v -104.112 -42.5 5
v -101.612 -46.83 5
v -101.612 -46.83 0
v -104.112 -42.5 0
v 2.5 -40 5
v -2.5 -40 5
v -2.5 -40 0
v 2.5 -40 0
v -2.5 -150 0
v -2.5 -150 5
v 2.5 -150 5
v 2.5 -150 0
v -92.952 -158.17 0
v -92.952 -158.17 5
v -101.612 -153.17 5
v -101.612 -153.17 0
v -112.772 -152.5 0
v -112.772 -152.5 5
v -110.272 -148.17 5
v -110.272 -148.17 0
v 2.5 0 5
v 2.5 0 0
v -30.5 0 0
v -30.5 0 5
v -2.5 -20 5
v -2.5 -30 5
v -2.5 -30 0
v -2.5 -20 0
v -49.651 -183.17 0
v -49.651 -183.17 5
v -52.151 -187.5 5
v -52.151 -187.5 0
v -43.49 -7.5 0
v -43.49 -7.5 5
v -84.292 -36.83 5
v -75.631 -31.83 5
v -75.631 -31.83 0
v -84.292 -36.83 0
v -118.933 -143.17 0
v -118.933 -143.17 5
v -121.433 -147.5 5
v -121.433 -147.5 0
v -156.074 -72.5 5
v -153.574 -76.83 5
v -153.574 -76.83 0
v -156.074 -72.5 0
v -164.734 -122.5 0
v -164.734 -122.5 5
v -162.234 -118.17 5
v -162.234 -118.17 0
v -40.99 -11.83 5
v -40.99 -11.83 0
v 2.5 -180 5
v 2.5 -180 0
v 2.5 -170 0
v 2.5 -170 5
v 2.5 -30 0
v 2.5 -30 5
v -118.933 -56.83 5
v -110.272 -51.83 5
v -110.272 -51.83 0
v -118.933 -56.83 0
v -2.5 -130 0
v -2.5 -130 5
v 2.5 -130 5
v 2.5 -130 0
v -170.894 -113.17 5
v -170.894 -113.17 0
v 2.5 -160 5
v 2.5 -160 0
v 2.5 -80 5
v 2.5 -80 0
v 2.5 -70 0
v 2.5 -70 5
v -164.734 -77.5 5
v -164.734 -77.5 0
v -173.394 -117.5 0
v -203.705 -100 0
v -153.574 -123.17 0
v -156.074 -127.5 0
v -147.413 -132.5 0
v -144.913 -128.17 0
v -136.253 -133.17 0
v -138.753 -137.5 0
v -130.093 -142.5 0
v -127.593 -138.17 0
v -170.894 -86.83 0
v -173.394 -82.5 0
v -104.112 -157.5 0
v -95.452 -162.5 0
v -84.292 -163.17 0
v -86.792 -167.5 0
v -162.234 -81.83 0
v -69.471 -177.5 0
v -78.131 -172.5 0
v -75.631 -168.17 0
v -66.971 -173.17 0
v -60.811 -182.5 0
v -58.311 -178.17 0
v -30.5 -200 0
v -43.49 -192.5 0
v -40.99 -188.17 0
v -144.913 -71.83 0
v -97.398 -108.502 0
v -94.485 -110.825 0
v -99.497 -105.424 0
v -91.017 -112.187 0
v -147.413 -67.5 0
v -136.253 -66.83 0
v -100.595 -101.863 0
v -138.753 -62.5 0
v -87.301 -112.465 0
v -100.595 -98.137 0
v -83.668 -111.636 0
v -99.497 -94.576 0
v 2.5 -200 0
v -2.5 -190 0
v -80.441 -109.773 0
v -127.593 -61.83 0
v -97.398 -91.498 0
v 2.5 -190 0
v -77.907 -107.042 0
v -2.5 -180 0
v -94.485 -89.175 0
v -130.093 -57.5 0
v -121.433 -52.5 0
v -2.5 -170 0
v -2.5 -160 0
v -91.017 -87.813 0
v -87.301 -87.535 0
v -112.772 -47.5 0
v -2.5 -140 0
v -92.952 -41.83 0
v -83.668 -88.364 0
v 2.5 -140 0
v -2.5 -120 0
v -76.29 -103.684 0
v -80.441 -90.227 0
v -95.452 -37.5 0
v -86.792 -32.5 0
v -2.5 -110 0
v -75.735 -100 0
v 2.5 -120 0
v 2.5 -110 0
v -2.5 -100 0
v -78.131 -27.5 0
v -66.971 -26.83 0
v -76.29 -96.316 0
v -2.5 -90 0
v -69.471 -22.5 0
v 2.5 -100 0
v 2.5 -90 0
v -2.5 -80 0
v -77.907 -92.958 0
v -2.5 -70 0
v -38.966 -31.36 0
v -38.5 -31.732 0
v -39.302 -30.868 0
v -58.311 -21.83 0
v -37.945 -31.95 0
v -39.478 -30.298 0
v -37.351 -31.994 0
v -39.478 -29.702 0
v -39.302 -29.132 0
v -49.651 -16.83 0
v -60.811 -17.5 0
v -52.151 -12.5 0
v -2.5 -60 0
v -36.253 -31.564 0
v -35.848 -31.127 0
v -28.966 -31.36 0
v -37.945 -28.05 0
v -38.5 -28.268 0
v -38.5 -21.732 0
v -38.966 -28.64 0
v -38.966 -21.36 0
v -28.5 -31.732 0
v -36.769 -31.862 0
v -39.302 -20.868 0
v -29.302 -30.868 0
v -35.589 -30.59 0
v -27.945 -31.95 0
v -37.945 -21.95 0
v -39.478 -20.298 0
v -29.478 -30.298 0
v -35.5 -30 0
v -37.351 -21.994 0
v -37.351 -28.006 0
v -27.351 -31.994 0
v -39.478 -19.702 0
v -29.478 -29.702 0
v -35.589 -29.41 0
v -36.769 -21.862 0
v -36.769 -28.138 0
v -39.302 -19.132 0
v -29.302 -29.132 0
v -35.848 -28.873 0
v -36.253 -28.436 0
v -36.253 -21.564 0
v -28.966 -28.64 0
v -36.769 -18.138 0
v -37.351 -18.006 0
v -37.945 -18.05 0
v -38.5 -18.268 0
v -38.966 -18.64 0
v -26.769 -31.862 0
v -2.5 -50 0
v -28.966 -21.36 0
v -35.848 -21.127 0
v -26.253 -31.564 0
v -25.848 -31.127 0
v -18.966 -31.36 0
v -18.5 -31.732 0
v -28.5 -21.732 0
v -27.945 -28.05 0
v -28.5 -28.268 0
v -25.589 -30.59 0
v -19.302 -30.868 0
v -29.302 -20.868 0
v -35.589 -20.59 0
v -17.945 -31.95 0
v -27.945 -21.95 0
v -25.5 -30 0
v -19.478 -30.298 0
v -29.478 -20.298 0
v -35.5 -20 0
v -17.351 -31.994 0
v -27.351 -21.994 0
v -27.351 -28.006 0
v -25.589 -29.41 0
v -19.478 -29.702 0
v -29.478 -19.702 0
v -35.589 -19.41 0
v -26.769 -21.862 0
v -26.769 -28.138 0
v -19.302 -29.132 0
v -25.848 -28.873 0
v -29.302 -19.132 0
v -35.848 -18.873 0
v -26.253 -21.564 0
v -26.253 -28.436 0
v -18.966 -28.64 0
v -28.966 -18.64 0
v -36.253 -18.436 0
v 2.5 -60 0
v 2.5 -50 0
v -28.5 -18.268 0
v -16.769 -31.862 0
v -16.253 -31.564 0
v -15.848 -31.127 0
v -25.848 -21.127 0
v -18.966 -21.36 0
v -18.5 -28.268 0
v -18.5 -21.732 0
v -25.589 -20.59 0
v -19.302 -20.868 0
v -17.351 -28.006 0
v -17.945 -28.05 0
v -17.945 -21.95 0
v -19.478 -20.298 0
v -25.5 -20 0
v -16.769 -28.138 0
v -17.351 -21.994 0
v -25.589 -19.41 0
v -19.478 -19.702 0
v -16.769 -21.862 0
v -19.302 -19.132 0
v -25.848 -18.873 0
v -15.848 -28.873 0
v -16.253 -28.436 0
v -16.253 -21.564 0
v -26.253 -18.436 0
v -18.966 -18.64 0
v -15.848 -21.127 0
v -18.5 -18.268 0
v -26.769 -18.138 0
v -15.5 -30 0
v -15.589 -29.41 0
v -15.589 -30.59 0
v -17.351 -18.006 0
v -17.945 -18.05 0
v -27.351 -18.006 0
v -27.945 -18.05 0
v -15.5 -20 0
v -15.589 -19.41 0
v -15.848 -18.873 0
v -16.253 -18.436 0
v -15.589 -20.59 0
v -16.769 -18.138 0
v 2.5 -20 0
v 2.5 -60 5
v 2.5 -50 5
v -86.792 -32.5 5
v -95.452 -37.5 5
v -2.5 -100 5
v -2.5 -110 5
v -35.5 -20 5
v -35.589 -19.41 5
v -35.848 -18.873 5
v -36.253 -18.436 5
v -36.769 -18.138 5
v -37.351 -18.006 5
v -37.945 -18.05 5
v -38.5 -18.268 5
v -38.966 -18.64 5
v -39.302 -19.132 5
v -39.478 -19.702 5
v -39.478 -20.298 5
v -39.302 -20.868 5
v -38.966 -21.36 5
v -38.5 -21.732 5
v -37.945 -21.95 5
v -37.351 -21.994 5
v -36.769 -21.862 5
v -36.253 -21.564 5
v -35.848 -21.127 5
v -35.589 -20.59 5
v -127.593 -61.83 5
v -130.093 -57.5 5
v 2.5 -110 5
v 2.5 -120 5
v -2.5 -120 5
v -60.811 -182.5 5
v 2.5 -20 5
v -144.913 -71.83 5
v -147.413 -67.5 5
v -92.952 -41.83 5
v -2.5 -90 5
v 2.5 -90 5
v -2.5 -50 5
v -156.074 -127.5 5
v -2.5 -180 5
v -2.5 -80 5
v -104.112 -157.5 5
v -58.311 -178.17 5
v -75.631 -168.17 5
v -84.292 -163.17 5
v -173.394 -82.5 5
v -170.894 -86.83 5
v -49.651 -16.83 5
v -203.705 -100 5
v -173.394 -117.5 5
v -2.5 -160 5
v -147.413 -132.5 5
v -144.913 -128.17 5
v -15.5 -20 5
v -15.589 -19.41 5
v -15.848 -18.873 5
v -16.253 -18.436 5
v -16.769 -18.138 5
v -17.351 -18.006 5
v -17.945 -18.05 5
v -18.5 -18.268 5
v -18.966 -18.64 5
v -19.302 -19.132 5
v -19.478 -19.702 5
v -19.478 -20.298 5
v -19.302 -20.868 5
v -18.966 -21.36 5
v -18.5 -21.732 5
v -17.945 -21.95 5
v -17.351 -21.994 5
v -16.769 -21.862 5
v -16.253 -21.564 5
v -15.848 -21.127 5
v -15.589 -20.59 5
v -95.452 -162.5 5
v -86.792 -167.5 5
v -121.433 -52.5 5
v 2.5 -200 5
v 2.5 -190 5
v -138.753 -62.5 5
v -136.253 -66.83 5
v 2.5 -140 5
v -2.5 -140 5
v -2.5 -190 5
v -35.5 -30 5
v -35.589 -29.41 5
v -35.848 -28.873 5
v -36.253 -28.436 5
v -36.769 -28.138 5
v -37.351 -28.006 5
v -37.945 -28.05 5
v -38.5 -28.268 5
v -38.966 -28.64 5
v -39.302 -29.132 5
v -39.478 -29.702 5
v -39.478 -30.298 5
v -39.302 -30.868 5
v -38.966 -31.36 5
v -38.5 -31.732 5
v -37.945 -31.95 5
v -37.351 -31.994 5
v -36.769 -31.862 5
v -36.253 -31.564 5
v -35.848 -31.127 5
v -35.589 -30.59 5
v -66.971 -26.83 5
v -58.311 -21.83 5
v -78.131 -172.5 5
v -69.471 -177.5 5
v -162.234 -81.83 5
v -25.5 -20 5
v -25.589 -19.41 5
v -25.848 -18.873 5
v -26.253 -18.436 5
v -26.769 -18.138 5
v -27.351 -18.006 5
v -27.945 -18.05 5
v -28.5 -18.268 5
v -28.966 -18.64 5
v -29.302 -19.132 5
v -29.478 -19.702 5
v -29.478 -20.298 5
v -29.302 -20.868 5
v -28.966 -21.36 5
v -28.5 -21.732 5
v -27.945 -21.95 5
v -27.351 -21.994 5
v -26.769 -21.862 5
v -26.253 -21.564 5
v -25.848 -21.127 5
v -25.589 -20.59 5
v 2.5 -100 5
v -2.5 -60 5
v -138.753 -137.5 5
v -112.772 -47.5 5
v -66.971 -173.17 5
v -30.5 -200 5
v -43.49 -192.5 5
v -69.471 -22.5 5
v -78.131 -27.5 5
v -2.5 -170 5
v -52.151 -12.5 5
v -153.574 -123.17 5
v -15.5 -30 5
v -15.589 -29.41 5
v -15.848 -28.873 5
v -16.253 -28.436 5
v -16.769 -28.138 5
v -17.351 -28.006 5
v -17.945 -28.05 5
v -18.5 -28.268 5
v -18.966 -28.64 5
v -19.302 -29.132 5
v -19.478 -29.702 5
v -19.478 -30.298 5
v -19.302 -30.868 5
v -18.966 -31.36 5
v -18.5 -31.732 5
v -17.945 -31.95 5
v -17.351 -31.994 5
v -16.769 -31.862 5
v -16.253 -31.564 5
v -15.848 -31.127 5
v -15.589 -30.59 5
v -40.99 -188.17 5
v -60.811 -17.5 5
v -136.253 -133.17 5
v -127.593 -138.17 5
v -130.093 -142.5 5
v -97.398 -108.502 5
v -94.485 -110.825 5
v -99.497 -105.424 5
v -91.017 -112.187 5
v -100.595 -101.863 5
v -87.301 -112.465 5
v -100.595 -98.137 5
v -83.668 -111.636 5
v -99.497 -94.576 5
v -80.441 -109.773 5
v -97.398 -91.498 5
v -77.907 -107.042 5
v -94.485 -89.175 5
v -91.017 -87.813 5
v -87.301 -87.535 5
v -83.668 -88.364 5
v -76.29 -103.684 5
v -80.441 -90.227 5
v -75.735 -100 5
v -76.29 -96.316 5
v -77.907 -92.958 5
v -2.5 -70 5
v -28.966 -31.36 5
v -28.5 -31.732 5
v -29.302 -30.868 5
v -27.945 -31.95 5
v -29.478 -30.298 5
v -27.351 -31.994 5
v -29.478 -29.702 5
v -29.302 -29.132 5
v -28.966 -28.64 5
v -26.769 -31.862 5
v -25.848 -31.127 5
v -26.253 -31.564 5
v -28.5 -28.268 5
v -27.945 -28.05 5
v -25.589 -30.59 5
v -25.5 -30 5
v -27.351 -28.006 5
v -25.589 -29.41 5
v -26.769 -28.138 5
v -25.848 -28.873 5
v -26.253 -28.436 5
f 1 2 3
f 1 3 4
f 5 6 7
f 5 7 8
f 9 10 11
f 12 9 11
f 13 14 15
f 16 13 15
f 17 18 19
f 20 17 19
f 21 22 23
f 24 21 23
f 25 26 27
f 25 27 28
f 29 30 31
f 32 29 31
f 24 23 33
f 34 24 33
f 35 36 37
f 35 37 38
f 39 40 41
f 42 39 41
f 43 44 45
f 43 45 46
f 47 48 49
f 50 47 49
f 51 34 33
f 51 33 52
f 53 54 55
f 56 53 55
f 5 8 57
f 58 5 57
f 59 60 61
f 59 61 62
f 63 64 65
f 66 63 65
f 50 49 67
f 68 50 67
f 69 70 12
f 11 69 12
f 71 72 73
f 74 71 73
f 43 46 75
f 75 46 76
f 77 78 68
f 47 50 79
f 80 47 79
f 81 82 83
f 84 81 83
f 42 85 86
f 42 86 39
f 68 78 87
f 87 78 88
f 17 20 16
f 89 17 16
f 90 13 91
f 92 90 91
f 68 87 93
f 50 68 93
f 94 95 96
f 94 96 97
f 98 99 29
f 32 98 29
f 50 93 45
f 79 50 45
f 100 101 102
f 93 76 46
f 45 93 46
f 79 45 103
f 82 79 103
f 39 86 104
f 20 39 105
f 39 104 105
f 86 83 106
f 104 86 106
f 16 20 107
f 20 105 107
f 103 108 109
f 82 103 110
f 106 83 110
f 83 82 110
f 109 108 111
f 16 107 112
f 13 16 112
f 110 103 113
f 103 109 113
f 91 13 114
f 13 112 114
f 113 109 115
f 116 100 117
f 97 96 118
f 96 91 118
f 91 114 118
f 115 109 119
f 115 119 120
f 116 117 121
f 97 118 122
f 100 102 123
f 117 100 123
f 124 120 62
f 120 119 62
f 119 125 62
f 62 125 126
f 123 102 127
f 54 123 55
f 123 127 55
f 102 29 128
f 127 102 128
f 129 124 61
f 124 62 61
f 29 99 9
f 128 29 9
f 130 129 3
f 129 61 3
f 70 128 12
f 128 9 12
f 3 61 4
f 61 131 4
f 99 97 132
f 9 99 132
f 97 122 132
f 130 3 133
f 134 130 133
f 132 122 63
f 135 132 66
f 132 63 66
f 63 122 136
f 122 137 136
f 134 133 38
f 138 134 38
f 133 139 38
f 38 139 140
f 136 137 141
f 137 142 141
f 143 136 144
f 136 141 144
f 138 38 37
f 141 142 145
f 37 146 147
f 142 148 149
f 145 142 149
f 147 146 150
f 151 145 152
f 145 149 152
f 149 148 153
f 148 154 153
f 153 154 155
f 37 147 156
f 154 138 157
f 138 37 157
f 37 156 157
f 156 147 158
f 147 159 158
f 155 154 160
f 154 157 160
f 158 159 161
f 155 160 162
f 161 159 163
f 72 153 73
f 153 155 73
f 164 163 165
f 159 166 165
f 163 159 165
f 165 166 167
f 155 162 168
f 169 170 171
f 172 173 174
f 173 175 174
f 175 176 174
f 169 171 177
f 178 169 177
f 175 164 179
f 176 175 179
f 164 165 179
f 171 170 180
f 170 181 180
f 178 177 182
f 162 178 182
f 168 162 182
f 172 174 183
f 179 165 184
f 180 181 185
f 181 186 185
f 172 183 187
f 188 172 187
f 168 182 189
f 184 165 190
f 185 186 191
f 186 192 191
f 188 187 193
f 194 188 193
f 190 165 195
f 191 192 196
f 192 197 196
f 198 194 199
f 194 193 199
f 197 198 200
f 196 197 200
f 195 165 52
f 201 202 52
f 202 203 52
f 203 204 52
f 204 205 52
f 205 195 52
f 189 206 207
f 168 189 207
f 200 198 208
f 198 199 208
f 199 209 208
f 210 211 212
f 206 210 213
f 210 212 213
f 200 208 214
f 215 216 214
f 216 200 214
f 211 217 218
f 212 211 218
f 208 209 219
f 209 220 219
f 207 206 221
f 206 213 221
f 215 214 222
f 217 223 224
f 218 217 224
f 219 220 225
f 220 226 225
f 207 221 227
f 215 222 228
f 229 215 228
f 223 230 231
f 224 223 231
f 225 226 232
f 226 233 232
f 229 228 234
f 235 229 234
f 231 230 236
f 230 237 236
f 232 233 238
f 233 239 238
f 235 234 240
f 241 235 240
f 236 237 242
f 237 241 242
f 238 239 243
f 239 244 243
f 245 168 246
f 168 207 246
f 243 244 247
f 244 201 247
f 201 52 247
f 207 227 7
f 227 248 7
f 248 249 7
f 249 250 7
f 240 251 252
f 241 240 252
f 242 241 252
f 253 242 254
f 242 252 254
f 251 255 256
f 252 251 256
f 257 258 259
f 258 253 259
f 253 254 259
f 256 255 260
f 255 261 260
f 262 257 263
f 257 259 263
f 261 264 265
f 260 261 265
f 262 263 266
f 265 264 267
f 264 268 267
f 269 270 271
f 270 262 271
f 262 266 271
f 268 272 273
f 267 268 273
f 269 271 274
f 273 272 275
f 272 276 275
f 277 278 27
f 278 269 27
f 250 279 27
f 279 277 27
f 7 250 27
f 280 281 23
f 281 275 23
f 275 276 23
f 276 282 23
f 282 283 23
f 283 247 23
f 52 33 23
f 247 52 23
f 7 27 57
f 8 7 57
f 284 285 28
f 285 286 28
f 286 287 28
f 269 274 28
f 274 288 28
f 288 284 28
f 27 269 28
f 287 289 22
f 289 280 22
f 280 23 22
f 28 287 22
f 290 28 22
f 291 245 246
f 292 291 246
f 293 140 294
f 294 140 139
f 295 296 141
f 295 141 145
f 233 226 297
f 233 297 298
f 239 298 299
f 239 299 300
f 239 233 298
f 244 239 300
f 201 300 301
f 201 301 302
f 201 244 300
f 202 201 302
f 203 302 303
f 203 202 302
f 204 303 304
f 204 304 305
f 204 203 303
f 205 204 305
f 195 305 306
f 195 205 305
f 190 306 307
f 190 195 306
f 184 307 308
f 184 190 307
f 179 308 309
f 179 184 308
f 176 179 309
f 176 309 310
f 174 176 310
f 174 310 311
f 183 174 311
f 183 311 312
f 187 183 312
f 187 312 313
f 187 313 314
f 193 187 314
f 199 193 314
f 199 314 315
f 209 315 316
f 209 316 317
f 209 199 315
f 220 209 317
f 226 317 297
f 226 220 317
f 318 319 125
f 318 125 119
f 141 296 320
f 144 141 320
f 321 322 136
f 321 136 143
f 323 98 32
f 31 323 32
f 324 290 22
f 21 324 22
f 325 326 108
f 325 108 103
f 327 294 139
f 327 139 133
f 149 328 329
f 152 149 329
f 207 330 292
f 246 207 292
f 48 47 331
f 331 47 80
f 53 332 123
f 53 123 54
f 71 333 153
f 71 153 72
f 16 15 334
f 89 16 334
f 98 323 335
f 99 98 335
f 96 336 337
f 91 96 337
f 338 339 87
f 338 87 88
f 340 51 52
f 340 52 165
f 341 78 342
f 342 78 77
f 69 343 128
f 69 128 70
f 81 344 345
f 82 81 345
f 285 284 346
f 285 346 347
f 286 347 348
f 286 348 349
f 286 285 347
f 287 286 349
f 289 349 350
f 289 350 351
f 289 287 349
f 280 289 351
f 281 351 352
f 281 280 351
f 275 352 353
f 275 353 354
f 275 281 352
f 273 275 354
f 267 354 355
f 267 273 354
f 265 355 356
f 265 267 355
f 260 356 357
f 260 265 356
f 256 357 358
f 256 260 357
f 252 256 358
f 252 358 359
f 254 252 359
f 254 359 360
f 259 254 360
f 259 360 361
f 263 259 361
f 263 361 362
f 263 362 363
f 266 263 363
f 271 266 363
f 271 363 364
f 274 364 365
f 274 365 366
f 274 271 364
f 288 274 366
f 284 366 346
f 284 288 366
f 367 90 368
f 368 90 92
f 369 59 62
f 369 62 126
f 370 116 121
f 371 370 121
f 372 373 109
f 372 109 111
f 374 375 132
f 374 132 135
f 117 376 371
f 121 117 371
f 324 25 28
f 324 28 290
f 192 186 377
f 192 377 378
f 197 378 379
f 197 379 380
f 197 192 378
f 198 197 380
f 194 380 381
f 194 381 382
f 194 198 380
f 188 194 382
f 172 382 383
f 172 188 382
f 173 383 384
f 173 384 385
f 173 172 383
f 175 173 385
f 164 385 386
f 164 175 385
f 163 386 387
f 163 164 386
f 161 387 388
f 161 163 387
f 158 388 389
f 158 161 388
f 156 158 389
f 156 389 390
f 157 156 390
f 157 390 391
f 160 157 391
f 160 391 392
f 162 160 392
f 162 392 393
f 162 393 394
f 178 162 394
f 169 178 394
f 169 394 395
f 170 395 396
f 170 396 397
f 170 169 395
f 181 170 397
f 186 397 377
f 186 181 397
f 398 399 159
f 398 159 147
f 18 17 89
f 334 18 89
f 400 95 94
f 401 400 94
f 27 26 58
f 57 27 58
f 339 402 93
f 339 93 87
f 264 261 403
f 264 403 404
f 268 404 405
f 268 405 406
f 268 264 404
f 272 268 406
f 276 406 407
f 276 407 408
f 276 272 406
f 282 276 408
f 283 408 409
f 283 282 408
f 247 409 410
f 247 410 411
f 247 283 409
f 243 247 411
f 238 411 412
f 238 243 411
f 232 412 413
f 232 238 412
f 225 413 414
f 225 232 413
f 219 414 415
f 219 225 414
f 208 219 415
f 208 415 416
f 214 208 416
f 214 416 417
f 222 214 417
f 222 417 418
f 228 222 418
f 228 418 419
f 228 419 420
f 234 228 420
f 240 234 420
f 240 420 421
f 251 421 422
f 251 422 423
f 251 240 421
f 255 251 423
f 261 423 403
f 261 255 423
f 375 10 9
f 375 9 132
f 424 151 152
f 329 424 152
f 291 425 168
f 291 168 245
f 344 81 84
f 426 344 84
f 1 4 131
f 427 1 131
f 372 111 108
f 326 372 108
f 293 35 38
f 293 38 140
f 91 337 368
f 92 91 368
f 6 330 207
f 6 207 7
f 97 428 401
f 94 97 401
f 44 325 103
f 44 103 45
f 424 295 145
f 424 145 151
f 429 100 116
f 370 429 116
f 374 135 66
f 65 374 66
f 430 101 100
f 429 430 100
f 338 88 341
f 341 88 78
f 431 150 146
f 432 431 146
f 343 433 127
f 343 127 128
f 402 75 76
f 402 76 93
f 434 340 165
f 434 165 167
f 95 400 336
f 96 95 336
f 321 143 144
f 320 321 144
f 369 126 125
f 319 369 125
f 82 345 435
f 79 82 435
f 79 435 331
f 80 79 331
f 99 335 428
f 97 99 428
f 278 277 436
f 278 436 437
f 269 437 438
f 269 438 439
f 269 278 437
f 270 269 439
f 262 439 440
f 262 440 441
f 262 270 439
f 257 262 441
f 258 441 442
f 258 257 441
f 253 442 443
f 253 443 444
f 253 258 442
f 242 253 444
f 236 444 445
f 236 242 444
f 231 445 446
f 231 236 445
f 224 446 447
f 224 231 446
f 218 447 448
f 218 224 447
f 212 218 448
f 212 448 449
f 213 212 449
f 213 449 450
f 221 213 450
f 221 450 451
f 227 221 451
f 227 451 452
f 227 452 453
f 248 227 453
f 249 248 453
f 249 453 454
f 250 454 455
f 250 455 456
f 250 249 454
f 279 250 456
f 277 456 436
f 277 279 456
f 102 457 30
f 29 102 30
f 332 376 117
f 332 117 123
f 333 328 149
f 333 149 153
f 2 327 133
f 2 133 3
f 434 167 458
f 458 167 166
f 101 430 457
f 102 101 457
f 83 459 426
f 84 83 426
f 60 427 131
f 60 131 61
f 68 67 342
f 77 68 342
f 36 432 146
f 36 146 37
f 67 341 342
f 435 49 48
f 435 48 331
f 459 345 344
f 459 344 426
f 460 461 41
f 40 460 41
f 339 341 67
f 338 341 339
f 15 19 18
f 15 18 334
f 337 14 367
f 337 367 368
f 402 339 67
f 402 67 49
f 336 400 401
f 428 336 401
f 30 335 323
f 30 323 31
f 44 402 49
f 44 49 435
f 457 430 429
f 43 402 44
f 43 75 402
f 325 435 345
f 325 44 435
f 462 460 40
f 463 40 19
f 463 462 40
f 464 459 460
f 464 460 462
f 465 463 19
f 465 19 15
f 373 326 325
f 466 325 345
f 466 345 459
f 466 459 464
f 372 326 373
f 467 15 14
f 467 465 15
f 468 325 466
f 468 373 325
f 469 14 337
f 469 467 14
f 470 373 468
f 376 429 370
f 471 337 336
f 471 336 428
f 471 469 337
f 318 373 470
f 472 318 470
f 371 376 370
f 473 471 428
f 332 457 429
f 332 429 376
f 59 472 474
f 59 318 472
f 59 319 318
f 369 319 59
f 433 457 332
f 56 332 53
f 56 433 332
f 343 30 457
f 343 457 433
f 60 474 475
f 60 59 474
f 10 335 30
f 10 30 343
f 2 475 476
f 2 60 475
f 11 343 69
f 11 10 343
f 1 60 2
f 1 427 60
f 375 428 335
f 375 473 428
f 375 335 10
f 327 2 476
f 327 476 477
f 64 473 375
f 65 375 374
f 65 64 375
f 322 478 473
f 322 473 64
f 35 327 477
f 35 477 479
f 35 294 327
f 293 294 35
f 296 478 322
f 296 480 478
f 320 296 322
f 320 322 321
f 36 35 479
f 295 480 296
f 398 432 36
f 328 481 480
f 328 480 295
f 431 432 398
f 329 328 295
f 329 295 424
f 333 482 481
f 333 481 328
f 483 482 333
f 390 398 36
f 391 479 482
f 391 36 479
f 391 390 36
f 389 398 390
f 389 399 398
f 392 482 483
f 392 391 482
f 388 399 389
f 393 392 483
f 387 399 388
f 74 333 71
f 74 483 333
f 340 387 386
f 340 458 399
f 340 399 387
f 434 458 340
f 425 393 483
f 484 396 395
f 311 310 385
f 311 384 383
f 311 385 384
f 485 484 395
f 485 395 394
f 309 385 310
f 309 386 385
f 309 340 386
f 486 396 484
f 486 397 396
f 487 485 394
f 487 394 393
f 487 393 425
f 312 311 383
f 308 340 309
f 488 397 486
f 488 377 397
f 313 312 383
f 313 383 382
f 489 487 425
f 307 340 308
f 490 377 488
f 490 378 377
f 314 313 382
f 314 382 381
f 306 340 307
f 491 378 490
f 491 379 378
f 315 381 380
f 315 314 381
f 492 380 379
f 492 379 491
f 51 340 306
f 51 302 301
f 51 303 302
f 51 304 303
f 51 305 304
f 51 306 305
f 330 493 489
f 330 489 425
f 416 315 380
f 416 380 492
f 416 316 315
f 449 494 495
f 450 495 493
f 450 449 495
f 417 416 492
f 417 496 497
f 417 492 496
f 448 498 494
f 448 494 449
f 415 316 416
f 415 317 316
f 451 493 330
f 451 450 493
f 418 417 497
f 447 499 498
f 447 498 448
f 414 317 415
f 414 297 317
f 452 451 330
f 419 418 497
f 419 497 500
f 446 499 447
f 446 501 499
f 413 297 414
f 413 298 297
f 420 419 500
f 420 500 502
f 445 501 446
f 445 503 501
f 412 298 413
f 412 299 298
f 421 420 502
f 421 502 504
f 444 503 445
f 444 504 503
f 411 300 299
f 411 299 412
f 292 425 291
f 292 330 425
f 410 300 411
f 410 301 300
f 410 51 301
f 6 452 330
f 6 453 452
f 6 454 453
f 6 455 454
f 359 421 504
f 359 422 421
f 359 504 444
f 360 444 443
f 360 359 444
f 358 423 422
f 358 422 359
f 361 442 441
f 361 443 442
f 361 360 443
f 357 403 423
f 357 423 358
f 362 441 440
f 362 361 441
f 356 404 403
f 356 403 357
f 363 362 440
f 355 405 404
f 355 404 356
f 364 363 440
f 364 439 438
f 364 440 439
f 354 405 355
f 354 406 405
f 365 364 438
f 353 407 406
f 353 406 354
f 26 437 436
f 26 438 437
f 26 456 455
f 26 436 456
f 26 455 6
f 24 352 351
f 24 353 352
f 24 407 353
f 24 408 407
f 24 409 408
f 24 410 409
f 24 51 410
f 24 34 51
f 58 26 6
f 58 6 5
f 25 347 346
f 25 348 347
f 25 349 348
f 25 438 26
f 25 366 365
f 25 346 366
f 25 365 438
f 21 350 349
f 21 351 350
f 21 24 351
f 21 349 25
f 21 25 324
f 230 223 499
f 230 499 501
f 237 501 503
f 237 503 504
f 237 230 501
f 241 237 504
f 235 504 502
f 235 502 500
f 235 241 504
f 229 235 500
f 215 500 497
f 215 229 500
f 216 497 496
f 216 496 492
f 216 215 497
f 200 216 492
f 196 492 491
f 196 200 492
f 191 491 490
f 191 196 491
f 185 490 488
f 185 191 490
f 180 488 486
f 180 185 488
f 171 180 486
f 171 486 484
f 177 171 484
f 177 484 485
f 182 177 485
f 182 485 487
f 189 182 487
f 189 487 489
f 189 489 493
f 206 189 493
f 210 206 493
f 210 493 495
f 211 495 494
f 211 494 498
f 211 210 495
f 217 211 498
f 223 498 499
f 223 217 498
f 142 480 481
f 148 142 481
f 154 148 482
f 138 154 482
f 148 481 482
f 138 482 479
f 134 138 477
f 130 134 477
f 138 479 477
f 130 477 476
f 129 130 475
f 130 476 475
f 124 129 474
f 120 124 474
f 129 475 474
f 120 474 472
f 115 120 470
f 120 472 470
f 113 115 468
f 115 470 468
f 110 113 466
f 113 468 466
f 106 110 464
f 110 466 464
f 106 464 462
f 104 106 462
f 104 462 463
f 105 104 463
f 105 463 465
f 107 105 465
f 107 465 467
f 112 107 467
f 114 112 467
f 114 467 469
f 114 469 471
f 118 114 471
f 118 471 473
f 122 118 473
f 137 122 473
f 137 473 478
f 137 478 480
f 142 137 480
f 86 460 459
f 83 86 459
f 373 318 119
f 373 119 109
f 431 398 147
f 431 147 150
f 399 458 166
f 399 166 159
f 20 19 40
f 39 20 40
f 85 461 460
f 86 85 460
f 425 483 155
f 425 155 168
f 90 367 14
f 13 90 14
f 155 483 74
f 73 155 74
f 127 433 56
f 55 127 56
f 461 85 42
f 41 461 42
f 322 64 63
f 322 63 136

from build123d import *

# Parameters (mm, degrees)
SKETCH1_R               = 2
BOSS_EXTRUDE1_DEPTH     = 5
SKETCH3_R               = 12.5
SKETCH3_W               = 5
SKETCH3_H               = 10
CUT_EXTRUDE5_DEPTH      = 1
CUT_EXTRUDE5_DEPTH_BACK = 6


with BuildPart() as part:
    # Sketch1 → Boss-Extrude1 (new body)
    with BuildSketch(Plane.XY):
        Polygon((2.5, -200), (2.5, 0), (-2.5, 0), (-30.5, 0), (-203.705080757, -100), (-30.5, -200), align=None)
        with Locations((-37.5, -30)):
            Circle(SKETCH1_R, mode=Mode.SUBTRACT)
        with Locations((-27.5, -30)):
            Circle(SKETCH1_R, mode=Mode.SUBTRACT)
        with Locations((-17.5, -30)):
            Circle(SKETCH1_R, mode=Mode.SUBTRACT)
        with Locations((-37.5, -20)):
            Circle(SKETCH1_R, mode=Mode.SUBTRACT)
        with Locations((-27.5, -20)):
            Circle(SKETCH1_R, mode=Mode.SUBTRACT)
        with Locations((-17.5, -20)):
            Circle(SKETCH1_R, mode=Mode.SUBTRACT)
    extrude(amount=BOSS_EXTRUDE1_DEPTH)

    # Sketch3 → Cut-Extrude5 (cut, two sides)
    with BuildSketch(Plane.XY.offset(5)) as cut_extrude5_sk:
        with Locations((-88.235026919, -100)):
            Circle(SKETCH3_R)
        Polygon((-121.432667397, -52.5), (-112.77241336, -47.5), (-110.27241336, -51.830127019), (-118.932667397, -56.830127019), align=None)
        Polygon((-101.612159322, -46.830127019), (-104.112159322, -42.5), (-95.451905284, -37.5), (-92.951905284, -41.830127019), align=None)
        Polygon((-84.291651246, -36.830127019), (-86.791651246, -32.5), (-78.131397208, -27.5), (-75.631397208, -31.830127019), align=None)
        Polygon((-66.97114317, -26.830127019), (-69.47114317, -22.5), (-60.810889132, -17.5), (-58.310889132, -21.830127019), align=None)
        Polygon((-49.650635095, -16.830127019), (-52.150635095, -12.5), (-43.490381057, -7.5), (-40.990381057, -11.830127019), align=None)
        Polygon((-136.253175473, -66.830127019), (-138.753175473, -62.5), (-130.092921435, -57.5), (-127.592921435, -61.830127019), align=None)
        Polygon((-153.573683549, -76.830127019), (-156.073683549, -72.5), (-147.413429511, -67.5), (-144.913429511, -71.830127019), align=None)
        Polygon((-170.894191624, -86.830127019), (-173.394191624, -82.5), (-164.733937587, -77.5), (-162.233937587, -81.830127019), align=None)
        Polygon((-112.77241336, -152.5), (-110.27241336, -148.169872981), (-118.932667397, -143.169872981), (-121.432667397, -147.5), align=None)
        Polygon((-173.394191624, -117.5), (-164.733937587, -122.5), (-162.233937587, -118.169872981), (-170.894191624, -113.169872981), align=None)
        Polygon((-156.073683549, -127.5), (-147.413429511, -132.5), (-144.913429511, -128.169872981), (-153.573683549, -123.169872981), align=None)
        Polygon((-138.753175473, -137.5), (-130.092921435, -142.5), (-127.592921435, -138.169872981), (-136.253175473, -133.169872981), align=None)
        Polygon((-52.150635095, -187.5), (-43.490381057, -192.5), (-40.990381057, -188.169872981), (-49.650635095, -183.169872981), align=None)
        Polygon((-69.47114317, -177.5), (-60.810889132, -182.5), (-58.310889132, -178.169872981), (-66.97114317, -173.169872981), align=None)
        Polygon((-86.791651246, -167.5), (-78.131397208, -172.5), (-75.631397208, -168.169872981), (-84.291651246, -163.169872981), align=None)
        Polygon((-104.112159322, -157.5), (-95.451905284, -162.5), (-92.951905284, -158.169872981), (-101.612159322, -153.169872981), align=None)
        with Locations((0, -85)):
            Rectangle(SKETCH3_W, SKETCH3_H)
        with Locations((0, -105)):
            Rectangle(SKETCH3_W, SKETCH3_H)
        with Locations((0, -65)):
            Rectangle(SKETCH3_W, SKETCH3_H)
        with Locations((0, -45)):
            Rectangle(SKETCH3_W, SKETCH3_H)
        with Locations((0, -25)):
            Rectangle(SKETCH3_W, SKETCH3_H)
        with Locations((0, -125)):
            Rectangle(SKETCH3_W, SKETCH3_H)
        with Locations((0, -145)):
            Rectangle(SKETCH3_W, SKETCH3_H)
        with Locations((0, -165)):
            Rectangle(SKETCH3_W, SKETCH3_H)
        with Locations((0, -185)):
            Rectangle(SKETCH3_W, SKETCH3_H)
    extrude(amount=CUT_EXTRUDE5_DEPTH, mode=Mode.SUBTRACT)
    extrude(cut_extrude5_sk.sketch, amount=-CUT_EXTRUDE5_DEPTH_BACK, mode=Mode.SUBTRACT)


solid = part.part
